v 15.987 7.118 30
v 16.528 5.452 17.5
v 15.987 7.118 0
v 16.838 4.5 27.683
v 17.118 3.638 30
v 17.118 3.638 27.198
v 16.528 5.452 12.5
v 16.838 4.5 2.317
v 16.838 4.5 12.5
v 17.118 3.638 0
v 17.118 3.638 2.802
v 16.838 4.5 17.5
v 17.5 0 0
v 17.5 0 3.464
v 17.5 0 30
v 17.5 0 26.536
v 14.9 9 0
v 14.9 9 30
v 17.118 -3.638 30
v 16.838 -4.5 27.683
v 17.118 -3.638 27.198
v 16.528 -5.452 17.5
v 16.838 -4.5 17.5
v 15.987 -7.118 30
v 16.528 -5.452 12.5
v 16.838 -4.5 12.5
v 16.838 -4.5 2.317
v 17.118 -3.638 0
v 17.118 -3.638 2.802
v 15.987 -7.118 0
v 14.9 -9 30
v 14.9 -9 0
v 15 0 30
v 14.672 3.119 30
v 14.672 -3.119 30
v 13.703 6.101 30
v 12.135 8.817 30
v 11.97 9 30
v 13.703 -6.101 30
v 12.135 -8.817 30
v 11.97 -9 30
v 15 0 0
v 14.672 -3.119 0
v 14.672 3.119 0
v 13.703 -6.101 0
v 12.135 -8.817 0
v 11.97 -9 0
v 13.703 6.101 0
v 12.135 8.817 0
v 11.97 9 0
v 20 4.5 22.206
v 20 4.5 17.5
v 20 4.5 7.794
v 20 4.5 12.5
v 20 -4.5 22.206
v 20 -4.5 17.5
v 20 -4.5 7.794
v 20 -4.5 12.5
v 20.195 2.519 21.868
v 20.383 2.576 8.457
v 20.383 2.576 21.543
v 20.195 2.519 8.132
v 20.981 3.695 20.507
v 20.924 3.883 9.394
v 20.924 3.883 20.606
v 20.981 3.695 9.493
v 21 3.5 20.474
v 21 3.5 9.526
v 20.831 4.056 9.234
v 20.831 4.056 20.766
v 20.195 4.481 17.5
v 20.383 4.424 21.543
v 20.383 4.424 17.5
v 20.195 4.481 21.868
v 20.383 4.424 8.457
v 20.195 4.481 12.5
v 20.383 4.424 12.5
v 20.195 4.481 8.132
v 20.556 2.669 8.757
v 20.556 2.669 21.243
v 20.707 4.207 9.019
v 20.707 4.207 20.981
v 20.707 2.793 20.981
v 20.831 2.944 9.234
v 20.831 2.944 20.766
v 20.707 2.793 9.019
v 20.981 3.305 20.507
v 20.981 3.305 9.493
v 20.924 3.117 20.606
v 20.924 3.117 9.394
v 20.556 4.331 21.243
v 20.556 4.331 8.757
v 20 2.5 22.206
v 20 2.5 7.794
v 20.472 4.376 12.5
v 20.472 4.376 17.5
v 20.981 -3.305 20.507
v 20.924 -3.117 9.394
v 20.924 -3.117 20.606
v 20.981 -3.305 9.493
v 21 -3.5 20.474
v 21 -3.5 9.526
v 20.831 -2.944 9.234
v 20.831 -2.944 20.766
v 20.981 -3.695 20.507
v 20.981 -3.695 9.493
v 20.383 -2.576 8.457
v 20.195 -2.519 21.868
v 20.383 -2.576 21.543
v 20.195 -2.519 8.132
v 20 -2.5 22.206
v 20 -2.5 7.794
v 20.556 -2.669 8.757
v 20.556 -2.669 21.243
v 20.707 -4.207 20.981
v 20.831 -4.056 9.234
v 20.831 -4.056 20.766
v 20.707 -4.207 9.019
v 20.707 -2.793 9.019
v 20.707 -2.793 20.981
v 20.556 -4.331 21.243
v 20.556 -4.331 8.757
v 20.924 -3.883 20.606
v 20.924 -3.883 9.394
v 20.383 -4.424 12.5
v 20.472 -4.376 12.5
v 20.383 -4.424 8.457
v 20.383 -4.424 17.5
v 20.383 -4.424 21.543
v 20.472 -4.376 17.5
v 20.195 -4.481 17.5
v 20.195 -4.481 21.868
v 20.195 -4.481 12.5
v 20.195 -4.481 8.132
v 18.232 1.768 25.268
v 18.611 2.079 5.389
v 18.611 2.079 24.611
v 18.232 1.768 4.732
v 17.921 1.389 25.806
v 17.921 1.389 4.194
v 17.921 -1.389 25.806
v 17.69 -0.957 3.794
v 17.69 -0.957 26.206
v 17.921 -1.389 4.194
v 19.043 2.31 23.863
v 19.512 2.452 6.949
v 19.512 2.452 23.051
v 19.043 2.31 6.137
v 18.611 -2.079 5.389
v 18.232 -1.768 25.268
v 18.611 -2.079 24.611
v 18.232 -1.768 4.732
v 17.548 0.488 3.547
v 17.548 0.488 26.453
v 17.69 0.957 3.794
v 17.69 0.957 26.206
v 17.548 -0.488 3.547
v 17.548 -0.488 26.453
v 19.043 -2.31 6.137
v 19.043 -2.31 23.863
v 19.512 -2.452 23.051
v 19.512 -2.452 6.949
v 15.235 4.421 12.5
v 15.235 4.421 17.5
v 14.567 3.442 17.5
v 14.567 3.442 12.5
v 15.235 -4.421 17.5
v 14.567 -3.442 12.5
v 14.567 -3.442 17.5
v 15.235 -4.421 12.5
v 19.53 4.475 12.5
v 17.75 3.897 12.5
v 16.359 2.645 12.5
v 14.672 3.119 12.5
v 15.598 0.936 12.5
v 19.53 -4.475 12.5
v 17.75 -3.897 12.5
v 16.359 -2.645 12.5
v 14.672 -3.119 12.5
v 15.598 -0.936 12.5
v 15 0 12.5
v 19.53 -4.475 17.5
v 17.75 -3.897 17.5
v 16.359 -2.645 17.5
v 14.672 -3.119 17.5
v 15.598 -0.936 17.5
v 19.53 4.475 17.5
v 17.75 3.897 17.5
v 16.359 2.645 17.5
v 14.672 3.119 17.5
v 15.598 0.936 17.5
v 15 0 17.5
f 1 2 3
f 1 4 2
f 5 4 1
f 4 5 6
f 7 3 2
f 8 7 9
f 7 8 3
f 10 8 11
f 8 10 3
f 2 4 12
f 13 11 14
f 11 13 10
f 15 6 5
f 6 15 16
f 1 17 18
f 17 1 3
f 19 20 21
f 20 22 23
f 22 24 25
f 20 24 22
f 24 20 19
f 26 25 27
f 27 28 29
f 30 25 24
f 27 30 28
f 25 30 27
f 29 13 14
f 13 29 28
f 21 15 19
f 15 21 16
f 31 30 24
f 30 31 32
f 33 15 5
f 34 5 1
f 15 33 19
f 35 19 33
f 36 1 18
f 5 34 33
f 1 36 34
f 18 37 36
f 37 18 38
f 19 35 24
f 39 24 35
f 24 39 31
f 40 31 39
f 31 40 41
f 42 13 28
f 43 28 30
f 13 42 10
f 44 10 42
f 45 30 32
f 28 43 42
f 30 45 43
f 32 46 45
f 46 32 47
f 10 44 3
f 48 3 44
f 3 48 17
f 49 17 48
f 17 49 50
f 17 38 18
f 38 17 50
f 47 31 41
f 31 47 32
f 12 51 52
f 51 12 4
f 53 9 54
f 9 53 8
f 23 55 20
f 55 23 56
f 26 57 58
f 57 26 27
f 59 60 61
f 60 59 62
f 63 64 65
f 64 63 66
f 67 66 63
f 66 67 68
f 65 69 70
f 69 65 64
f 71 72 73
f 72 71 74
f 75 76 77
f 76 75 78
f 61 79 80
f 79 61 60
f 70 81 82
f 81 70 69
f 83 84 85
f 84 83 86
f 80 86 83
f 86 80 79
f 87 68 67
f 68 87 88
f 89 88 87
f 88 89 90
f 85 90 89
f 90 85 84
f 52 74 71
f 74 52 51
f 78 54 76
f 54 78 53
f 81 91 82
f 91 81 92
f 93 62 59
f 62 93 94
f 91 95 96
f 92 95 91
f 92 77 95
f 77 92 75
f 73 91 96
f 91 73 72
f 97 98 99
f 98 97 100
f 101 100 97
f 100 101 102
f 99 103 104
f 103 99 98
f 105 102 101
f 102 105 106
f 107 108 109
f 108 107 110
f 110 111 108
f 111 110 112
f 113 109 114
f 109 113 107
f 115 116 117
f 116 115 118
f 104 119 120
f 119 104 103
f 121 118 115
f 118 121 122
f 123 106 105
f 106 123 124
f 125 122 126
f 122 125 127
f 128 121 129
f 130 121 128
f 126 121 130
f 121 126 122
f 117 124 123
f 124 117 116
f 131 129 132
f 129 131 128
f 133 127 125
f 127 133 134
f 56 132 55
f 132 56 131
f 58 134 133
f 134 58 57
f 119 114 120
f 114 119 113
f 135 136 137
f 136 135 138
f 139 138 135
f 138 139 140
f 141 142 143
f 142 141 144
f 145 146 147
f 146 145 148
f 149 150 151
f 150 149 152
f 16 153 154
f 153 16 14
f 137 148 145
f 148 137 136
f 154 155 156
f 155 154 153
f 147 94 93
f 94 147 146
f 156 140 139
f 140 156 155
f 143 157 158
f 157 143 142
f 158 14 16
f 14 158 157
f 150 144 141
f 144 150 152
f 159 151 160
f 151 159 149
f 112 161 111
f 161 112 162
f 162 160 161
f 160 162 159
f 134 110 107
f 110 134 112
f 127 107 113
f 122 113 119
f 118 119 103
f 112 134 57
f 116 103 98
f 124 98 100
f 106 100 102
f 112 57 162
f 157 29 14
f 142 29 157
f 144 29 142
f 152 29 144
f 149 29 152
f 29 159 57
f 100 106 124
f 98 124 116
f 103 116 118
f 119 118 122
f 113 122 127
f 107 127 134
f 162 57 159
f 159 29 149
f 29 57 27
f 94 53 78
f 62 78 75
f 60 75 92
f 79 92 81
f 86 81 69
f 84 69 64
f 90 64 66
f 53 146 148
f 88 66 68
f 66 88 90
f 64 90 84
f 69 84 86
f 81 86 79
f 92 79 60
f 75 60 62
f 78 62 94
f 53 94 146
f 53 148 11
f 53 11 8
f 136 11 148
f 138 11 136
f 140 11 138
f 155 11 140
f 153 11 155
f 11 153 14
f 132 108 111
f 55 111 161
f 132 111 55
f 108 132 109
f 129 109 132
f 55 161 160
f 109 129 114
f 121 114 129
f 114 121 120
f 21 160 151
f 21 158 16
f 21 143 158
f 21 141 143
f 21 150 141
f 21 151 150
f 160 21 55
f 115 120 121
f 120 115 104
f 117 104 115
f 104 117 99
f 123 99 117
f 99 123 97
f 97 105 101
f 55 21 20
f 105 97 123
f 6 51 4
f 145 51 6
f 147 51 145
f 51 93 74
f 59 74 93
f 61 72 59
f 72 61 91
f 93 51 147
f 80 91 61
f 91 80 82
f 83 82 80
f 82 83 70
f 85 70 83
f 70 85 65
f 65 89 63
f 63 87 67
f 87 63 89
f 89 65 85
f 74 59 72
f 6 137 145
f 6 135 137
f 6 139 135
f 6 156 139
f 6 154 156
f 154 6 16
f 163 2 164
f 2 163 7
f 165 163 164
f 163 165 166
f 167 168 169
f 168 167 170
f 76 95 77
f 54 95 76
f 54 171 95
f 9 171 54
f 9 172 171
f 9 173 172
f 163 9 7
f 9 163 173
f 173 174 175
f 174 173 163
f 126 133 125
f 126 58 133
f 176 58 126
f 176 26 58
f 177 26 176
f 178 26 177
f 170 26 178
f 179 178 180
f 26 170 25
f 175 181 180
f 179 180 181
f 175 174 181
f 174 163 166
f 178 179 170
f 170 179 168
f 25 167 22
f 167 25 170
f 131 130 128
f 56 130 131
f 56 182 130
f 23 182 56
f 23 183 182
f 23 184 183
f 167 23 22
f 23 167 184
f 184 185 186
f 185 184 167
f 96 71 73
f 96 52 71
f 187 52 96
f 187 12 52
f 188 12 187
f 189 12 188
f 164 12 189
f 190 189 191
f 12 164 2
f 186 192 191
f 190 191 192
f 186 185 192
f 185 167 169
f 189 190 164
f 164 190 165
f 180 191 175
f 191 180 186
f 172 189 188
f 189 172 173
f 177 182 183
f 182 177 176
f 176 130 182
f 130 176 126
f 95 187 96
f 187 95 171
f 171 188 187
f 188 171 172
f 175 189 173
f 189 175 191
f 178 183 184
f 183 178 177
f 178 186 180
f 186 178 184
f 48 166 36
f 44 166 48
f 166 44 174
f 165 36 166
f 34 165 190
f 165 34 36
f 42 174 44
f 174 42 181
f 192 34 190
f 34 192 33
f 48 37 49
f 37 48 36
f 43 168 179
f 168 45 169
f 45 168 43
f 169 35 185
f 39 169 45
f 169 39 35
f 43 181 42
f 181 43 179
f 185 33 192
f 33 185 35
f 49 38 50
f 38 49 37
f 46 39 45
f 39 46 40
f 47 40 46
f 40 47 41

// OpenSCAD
tube_diam = 30;
wall_width = 2.5;

cabled = 5; //cable diameter
cabler = cabled /2;
cableww = 2; //cable wall width
cangle = 30;

length = 30;


//cable ties
tiew = 5;
tieh = 2;

loopd = cabled + cableww *2;


//maths
clampw = cabled+cableww*2;
tube_circum = 3.13159 * tube_diam;
// double clamp width
angle = 360 * clampw * 2 / tube_circum;

bracingr = tube_diam / 2 + wall_width;


module tubebody(){
	intersection() {
		cylinder(h = length, r = bracingr);
		translate([0,-clampw, 0])cube([bracingr, clampw *2, length]);	
	}
	
	
}

//body no cutouts
module clamp_body_1() {
	$fn=32;
	translate([-cabler-cableww, -cabler - cableww,0])
		cube([cabler + cableww,cabled + cableww*2,length/2]);
	translate([0,cabler +cableww/2 , 0])
		cylinder(h = length/2, r = cableww/2);
	translate([0,-cabler- cableww/2 , 0])
		cylinder(h = length/2, r = cableww/2);
}

//cut out cable and slope
module clamp_body_2() {
	$fn=32;
	//cable
	difference(){
		clamp_body_1();
		cylinder(h= length, r = cabler);
		//slope
		translate([-cabler-cableww,0,0])
			rotate([0,cangle,0])
				translate([0,-cabled*3,0])
					cube([cabled*6,cabled*6,length]);
	}
	
}

//mirror for both sides
module clamp_body_3() {
	translate([0,0 ,length ])
	mirror([0, 0, 1])
	clamp_body_2();
	clamp_body_2();
}


module body_all(){
	tubebody();
	translate([bracingr  + wall_width,0 , 0])
		clamp_body_3();	
}

module body_final() {
	difference() {
		body_all();	
		cylinder(h = length, r = tube_diam/2 );

		//cable ties
		#translate([bracingr  + wall_width,0,length /2-tiew/2])cabletie();
	}
	
}

module cabletie() {
	difference() {
		cylinder(h = tiew, r = loopd/2 + tieh);
		cylinder(h = tiew, r = loopd/2 );	
	}
	
}

body_final();
//cabletie();
//clamp_body_2();
